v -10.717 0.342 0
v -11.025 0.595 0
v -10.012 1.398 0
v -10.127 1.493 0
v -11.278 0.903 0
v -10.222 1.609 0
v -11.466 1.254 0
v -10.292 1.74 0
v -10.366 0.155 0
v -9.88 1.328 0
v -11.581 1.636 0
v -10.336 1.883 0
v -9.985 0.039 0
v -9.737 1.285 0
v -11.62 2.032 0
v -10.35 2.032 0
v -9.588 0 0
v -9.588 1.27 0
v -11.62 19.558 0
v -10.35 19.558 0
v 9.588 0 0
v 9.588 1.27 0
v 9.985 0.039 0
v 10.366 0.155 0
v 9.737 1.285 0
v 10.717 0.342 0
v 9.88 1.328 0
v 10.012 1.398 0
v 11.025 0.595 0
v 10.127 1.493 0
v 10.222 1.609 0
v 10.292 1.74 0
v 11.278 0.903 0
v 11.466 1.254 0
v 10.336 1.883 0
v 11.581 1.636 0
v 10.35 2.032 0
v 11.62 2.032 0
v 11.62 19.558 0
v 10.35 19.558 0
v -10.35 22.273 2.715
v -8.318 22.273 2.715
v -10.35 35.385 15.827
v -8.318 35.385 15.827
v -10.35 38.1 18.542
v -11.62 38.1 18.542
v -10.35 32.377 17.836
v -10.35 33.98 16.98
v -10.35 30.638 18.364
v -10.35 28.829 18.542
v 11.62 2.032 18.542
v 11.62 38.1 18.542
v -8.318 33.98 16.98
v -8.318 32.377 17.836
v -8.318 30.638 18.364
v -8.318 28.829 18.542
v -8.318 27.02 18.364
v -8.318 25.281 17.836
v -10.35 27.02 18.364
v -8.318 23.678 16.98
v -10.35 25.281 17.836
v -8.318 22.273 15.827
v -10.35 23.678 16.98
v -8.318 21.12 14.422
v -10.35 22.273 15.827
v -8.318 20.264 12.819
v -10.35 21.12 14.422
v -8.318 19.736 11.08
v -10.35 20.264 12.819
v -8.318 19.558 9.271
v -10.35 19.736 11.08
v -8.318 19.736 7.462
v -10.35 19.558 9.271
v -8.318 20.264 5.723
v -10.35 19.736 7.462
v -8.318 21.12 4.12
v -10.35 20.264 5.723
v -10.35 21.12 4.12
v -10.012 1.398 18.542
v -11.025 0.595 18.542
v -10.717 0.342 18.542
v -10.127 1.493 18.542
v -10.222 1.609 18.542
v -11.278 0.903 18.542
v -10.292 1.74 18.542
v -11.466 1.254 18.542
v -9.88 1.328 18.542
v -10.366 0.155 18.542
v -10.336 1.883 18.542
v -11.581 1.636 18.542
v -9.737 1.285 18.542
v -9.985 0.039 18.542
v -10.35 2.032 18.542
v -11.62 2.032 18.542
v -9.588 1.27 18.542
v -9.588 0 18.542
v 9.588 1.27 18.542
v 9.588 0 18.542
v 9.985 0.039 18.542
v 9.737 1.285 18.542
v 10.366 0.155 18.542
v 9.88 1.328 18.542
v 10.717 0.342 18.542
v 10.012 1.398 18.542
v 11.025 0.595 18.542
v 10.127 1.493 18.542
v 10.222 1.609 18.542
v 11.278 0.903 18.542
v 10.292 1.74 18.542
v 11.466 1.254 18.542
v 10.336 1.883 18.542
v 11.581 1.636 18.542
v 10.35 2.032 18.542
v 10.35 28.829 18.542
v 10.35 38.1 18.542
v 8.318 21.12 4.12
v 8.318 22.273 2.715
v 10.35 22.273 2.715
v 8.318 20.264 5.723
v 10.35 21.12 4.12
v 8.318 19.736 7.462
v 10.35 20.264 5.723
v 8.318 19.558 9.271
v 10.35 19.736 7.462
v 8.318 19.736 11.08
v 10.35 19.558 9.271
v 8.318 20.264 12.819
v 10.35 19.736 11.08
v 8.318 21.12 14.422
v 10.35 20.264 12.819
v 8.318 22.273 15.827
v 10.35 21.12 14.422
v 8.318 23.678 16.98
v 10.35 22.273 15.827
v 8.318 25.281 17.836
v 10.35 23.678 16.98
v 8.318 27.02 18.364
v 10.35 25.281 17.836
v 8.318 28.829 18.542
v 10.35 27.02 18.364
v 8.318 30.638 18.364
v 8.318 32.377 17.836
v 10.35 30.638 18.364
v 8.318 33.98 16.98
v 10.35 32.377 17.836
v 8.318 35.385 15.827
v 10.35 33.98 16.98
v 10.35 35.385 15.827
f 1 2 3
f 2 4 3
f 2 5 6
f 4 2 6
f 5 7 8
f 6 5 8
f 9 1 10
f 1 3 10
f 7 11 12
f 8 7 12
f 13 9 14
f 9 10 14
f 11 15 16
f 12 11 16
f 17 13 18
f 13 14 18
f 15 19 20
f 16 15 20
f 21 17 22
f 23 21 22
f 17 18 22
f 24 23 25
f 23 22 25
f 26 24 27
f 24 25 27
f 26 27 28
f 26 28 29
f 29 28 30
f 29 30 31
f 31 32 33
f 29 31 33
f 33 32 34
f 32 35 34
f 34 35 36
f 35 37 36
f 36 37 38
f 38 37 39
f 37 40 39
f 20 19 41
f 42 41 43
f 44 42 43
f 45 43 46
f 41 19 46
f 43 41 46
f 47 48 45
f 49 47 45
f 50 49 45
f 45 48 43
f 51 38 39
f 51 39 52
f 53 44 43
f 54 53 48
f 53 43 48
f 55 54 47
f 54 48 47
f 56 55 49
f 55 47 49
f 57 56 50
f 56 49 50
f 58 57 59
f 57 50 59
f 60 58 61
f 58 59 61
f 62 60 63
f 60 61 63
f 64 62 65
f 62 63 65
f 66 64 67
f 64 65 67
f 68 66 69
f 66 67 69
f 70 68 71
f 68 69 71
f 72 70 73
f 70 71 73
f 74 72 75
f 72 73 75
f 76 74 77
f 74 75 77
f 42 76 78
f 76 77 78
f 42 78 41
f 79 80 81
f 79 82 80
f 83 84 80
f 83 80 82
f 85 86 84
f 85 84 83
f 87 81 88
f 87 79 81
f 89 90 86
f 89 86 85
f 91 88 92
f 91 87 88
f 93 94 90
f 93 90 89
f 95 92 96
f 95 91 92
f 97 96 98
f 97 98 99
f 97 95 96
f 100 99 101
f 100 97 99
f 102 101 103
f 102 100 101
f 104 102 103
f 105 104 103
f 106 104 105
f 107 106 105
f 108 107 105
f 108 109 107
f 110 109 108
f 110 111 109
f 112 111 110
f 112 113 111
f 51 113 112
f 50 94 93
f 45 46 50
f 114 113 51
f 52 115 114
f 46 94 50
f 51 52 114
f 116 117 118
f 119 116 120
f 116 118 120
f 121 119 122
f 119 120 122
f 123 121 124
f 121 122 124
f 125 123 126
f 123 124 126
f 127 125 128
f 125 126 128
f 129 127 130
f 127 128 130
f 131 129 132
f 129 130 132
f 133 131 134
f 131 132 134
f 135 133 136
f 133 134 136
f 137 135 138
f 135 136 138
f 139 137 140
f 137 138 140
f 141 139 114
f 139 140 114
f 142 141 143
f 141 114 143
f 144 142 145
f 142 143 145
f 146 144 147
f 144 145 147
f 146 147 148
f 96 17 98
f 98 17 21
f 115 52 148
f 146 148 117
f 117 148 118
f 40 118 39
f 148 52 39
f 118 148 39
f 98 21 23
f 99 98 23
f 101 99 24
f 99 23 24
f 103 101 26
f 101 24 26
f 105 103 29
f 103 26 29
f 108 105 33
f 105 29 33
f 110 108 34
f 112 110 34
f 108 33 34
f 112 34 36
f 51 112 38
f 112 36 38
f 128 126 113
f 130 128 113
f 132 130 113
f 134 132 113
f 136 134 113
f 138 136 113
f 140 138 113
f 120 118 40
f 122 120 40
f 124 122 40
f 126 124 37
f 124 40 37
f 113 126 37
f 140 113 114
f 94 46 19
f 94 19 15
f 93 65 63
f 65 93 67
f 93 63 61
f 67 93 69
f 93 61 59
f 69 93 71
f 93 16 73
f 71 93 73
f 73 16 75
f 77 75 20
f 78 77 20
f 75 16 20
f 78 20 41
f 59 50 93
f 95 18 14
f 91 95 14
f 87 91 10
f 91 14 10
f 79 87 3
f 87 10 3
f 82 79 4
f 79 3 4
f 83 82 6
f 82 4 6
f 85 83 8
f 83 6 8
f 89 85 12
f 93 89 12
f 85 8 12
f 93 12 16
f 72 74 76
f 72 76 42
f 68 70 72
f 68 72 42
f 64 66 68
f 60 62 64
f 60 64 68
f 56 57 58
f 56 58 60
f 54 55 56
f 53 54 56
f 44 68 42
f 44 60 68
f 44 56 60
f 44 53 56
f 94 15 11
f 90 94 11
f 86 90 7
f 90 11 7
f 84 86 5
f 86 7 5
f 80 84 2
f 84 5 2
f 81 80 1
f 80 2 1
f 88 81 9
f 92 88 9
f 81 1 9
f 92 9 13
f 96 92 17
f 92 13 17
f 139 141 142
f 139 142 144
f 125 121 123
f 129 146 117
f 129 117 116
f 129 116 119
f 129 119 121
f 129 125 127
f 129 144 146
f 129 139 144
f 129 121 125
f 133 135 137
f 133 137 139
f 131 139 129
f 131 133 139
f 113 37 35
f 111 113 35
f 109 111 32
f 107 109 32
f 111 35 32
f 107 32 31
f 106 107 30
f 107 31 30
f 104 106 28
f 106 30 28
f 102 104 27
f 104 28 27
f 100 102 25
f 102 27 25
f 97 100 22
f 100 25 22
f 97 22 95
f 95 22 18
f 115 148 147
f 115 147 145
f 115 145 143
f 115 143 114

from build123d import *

# Parameters (mm, degrees)
F1_DEPTH = 18.542
F3_DEPTH = 23.242
F5_DEPTH = 2.032
F7_DEPTH = 2.032


with BuildPart() as f1:
    # F0 (on Top) → F1 (new body)
    with BuildSketch(Plane.XY):
        with BuildLine():
            Line((-10.3505, 38.1), (-11.6205, 38.1))
            Line((-11.6205, 38.1), (-11.6205, 2.032))
            ThreePointArc((-11.6205, 2.032), (-11.025341, 0.595159), (-9.5885, 0))
            Line((-9.5885, 0), (9.5885, 0))
            ThreePointArc((9.5885, 0), (11.025341, 0.595159), (11.6205, 2.032))
            Line((11.6205, 2.032), (11.6205, 38.1))
            Line((11.6205, 38.1), (10.3505, 38.1))
            Line((10.3505, 38.1), (10.3505, 2.032))
            ThreePointArc((10.3505, 2.032), (10.127315, 1.493185), (9.5885, 1.27))
            Line((9.5885, 1.27), (-9.5885, 1.27))
            ThreePointArc((-9.5885, 1.27), (-10.127315, 1.493185), (-10.3505, 2.032))
            Line((-10.3505, 2.032), (-10.3505, 38.1))
        make_face()
    extrude(amount=F1_DEPTH)

    # F2 (on face) → F3 (cut, through all)
    with BuildSketch(Plane.YZ.offset(11.6205)):
        Polygon((38.1, 0), (38.1, 18.542), (19.558, 0), align=None)
    extrude(amount=-F3_DEPTH, mode=Mode.SUBTRACT)

    # F4 (on face) → F5 (join)
    with BuildSketch(Plane.YZ.offset(-10.3505)):
        with BuildLine():
            Line((22.273413, 2.715413), (35.384587, 15.826587))
            ThreePointArc((35.384587, 15.826587), (22.273413, 15.826587), (22.273413, 2.715413))
        make_face()
    extrude(amount=F5_DEPTH)

    # F6 (on face) → F7 (join)
    with BuildSketch(Plane(origin=(10.3505, 0, 0), x_dir=(0, -1, 0), z_dir=(-1, 0, 0))):
        with BuildLine():
            Line((-35.384587, 15.826587), (-22.273413, 2.715413))
            ThreePointArc((-22.273413, 2.715413), (-22.273413, 15.826587), (-35.384587, 15.826587))
        make_face()
    extrude(amount=F7_DEPTH)


solid = f1.part
